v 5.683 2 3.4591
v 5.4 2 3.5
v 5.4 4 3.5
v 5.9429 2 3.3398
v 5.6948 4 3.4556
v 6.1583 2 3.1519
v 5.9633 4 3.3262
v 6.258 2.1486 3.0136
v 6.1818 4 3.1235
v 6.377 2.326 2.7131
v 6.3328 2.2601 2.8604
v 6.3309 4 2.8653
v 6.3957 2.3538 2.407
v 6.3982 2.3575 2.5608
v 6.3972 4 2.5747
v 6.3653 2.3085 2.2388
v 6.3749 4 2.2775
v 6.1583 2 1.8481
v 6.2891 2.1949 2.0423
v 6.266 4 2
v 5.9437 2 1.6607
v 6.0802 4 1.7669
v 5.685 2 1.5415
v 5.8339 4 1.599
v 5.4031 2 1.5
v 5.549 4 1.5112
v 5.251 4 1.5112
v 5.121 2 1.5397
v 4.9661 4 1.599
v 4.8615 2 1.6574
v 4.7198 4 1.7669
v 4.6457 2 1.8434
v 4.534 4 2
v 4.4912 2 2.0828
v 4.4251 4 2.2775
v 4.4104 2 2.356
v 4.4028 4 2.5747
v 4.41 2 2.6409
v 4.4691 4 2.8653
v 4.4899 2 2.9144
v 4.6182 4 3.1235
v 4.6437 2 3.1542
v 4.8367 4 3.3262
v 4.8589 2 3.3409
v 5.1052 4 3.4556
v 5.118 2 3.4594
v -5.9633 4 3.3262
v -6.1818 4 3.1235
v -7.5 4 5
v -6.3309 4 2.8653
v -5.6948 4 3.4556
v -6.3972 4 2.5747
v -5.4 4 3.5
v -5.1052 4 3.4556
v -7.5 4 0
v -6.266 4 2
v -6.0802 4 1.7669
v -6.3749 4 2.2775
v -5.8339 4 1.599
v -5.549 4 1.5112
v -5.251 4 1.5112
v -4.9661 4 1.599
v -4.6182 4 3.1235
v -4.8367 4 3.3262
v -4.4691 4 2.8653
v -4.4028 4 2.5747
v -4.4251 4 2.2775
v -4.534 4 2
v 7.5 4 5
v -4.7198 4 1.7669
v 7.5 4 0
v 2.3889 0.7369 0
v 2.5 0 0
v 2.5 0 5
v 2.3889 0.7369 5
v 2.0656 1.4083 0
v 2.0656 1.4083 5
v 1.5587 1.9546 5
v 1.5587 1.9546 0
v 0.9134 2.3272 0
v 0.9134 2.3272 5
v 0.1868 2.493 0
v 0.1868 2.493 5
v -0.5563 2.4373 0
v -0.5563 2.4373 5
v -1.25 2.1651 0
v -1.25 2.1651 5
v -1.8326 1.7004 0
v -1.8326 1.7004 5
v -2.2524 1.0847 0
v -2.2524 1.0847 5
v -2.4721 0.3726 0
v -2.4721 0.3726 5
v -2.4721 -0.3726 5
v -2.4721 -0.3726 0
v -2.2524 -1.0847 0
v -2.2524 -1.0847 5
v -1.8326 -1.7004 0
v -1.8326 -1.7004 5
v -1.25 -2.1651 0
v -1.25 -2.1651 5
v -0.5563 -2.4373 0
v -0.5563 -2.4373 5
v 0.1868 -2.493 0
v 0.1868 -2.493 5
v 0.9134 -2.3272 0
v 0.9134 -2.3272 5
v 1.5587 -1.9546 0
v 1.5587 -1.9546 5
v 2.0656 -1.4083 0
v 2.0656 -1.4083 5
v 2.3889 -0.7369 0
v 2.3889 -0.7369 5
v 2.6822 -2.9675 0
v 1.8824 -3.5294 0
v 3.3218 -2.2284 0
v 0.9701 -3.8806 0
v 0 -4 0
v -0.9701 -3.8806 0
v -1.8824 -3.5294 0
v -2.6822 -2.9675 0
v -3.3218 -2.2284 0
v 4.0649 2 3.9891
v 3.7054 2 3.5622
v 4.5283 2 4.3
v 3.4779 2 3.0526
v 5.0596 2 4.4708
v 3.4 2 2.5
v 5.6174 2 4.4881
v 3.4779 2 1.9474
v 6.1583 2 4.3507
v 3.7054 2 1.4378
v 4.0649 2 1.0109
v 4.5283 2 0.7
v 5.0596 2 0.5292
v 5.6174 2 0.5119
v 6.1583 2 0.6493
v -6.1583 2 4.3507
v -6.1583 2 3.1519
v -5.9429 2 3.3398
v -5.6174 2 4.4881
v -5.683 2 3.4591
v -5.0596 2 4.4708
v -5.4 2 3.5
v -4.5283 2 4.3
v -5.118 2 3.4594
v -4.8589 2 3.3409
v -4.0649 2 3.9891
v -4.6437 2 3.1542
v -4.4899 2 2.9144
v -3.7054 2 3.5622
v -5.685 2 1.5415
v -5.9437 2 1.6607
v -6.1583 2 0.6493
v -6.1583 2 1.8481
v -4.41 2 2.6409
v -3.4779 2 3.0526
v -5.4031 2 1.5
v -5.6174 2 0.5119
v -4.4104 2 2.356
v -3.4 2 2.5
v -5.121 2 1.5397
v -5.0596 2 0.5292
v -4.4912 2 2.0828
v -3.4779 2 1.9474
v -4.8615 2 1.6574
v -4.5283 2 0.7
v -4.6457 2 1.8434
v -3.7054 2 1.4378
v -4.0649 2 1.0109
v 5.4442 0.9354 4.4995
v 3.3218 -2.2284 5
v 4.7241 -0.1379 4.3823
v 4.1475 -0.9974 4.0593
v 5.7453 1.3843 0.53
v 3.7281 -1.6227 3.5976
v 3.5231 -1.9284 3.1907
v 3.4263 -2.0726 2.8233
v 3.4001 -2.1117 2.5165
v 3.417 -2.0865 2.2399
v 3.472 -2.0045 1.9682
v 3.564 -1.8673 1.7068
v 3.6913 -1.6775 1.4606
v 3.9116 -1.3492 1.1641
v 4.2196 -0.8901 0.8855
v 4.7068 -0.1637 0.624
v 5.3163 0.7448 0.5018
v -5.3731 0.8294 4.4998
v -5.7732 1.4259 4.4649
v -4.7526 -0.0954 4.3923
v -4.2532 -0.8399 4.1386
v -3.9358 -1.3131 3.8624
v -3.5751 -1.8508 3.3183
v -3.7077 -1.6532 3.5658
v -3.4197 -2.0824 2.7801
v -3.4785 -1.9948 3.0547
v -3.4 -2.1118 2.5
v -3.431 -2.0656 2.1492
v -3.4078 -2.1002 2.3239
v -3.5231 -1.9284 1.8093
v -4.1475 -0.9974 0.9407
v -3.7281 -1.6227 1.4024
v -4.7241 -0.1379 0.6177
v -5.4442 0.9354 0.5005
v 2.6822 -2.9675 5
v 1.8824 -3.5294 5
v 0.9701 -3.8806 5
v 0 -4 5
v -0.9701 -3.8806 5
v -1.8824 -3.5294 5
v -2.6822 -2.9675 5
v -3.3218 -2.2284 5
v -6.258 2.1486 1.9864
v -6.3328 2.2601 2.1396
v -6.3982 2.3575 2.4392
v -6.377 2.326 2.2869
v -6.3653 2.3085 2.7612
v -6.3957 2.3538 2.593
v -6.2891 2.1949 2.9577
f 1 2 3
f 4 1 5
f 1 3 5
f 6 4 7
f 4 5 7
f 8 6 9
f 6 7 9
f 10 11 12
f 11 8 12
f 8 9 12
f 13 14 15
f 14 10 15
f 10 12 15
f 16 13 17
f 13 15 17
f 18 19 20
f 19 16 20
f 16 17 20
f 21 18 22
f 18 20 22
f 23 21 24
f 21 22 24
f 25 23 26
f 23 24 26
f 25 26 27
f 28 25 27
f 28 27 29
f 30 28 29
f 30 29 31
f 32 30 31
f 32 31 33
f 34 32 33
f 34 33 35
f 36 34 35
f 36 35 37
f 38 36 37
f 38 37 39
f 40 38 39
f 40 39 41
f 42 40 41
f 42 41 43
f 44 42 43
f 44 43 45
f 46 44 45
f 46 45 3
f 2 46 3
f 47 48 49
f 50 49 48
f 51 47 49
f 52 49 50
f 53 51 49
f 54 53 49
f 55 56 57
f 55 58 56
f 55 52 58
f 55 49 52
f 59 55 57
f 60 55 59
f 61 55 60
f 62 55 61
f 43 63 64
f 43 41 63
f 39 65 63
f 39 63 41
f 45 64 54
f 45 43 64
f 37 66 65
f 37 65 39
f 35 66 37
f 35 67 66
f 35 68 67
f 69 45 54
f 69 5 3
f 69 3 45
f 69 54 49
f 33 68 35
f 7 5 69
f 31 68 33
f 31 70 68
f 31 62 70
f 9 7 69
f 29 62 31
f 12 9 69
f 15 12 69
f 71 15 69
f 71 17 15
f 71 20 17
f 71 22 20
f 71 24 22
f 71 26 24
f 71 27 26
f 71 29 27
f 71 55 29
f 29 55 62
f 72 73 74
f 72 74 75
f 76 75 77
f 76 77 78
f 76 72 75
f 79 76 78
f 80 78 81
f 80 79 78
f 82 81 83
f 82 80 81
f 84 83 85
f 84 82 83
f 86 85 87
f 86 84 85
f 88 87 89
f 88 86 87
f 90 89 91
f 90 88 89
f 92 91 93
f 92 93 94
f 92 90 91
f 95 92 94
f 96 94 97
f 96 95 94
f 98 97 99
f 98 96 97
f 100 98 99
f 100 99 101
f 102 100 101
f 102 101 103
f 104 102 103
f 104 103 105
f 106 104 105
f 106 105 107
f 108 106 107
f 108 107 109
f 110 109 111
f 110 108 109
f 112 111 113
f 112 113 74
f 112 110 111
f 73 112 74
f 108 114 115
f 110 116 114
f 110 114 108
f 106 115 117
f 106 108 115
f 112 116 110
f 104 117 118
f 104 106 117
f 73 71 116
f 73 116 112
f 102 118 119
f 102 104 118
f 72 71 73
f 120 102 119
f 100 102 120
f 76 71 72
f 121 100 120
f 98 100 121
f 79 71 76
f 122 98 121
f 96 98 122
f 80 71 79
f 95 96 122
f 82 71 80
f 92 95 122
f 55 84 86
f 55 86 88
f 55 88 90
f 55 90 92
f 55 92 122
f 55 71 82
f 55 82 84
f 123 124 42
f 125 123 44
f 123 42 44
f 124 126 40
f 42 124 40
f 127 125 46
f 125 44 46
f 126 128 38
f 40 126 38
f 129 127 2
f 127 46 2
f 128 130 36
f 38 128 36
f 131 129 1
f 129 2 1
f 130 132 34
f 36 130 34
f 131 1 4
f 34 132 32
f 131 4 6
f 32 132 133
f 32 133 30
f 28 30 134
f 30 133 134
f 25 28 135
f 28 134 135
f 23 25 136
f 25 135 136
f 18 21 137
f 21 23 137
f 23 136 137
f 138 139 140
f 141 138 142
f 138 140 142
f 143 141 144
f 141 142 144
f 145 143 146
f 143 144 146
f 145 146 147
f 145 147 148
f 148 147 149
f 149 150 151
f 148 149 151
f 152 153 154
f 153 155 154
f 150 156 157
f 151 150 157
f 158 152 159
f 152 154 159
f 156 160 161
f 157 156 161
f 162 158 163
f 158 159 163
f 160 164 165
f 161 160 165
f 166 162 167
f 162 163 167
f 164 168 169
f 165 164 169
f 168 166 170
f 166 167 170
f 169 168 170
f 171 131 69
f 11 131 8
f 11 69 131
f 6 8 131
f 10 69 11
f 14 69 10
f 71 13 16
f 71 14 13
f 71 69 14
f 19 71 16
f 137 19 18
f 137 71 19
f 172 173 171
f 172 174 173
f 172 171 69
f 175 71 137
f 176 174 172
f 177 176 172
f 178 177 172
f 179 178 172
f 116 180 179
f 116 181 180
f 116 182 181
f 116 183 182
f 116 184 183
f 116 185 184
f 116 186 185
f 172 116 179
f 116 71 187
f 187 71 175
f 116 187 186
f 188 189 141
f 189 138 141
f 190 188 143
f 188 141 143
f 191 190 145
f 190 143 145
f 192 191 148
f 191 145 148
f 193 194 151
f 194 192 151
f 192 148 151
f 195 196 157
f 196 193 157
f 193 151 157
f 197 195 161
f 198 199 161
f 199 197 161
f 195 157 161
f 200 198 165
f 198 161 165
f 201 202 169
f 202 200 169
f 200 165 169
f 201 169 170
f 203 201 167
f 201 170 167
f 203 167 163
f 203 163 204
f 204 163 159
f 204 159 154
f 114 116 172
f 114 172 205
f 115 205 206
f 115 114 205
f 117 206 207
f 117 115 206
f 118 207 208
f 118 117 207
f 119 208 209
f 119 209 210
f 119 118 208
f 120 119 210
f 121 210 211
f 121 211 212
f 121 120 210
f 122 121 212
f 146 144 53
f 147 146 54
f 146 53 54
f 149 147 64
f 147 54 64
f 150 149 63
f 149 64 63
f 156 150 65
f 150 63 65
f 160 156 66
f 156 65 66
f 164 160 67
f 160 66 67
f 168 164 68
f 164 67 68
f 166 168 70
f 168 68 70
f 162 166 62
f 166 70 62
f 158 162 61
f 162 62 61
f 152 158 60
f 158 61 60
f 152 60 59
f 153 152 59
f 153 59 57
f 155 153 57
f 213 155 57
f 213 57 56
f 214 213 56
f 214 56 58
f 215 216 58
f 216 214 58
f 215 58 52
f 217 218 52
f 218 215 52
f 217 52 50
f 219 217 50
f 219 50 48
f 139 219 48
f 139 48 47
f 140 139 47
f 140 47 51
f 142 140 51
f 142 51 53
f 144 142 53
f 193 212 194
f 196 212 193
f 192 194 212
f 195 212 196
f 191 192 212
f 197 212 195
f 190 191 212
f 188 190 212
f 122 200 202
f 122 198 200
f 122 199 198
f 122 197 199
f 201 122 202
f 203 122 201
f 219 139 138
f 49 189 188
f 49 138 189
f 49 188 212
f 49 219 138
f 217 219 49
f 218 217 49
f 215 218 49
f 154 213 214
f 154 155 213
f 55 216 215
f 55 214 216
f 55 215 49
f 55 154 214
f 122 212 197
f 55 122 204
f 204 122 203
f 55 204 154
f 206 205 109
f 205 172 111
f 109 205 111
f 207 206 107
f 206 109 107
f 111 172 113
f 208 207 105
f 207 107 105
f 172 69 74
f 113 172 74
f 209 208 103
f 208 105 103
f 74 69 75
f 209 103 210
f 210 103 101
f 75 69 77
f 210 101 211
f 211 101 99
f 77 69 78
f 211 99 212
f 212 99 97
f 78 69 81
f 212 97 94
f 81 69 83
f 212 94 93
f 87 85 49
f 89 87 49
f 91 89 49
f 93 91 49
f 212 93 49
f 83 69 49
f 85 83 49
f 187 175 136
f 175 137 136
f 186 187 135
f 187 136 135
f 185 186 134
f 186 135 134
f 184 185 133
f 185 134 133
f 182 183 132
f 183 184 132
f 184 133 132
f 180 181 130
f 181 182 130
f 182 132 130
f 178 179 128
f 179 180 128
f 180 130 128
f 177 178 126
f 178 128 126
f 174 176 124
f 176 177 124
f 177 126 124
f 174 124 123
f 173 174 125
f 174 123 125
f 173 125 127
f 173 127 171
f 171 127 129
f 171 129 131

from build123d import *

# Parameters (mm, degrees)
SKETCH1_R           = 2.5
BOSS_EXTRUDE1_DEPTH = 5
CUT_EXTRUDE1_START  = -2
SKETCH2_R           = 2
SKETCH2_R_2         = 1
CUT_EXTRUDE1_DEPTH  = 11.051970793
SKETCH2_2_R         = 1
CUT_EXTRUDE2_DEPTH  = 13.051970793


with BuildPart() as part:
    # Sketch1 → Boss-Extrude1 (new body)
    with BuildSketch(Plane.XY):
        with BuildLine():
            Line((-7.5, 4), (7.5, 4))
            Line((7.5, 4), (3.321799308, -2.228373702))
            ThreePointArc((3.321799308, -2.228373702), (0, -4), (-3.321799308, -2.228373702))
            Line((-3.321799308, -2.228373702), (-7.5, 4))
        make_face()
        Circle(SKETCH1_R, mode=Mode.SUBTRACT)
    extrude(amount=BOSS_EXTRUDE1_DEPTH)

    # Sketch2 → Cut-Extrude1 (cut, through all)
    # profile 1 of 2: a face of its own
    with BuildSketch(Plane(origin=(0, 4, 0), x_dir=(1, 0, 0), z_dir=(0, 1, 0)).offset(CUT_EXTRUDE1_START)):
        with Locations((-5.4, -2.5)):
            Circle(SKETCH2_R)
        with Locations((-5.4, -2.5)):
            Circle(SKETCH2_R_2, mode=Mode.SUBTRACT)
    # profile 2 of 2: a face of its own
    with BuildSketch(Plane(origin=(0, 4, 0), x_dir=(1, 0, 0), z_dir=(0, 1, 0)).offset(CUT_EXTRUDE1_START)):
        with Locations((5.4, -2.5)):
            Circle(SKETCH2_R)
        with Locations((5.4, -2.5)):
            Circle(SKETCH2_R_2, mode=Mode.SUBTRACT)
    extrude(amount=-CUT_EXTRUDE1_DEPTH, mode=Mode.SUBTRACT)

    # Sketch2<2> → Cut-Extrude2 (cut, through all)
    with BuildSketch(Plane(origin=(0, 4, 0), x_dir=(1, 0, 0), z_dir=(0, 1, 0))):
        with Locations((-5.4, -2.5)):
            Circle(SKETCH2_2_R)
        with Locations((5.4, -2.5)):
            Circle(SKETCH2_2_R)
    extrude(amount=-CUT_EXTRUDE2_DEPTH, mode=Mode.SUBTRACT)


solid = part.part
